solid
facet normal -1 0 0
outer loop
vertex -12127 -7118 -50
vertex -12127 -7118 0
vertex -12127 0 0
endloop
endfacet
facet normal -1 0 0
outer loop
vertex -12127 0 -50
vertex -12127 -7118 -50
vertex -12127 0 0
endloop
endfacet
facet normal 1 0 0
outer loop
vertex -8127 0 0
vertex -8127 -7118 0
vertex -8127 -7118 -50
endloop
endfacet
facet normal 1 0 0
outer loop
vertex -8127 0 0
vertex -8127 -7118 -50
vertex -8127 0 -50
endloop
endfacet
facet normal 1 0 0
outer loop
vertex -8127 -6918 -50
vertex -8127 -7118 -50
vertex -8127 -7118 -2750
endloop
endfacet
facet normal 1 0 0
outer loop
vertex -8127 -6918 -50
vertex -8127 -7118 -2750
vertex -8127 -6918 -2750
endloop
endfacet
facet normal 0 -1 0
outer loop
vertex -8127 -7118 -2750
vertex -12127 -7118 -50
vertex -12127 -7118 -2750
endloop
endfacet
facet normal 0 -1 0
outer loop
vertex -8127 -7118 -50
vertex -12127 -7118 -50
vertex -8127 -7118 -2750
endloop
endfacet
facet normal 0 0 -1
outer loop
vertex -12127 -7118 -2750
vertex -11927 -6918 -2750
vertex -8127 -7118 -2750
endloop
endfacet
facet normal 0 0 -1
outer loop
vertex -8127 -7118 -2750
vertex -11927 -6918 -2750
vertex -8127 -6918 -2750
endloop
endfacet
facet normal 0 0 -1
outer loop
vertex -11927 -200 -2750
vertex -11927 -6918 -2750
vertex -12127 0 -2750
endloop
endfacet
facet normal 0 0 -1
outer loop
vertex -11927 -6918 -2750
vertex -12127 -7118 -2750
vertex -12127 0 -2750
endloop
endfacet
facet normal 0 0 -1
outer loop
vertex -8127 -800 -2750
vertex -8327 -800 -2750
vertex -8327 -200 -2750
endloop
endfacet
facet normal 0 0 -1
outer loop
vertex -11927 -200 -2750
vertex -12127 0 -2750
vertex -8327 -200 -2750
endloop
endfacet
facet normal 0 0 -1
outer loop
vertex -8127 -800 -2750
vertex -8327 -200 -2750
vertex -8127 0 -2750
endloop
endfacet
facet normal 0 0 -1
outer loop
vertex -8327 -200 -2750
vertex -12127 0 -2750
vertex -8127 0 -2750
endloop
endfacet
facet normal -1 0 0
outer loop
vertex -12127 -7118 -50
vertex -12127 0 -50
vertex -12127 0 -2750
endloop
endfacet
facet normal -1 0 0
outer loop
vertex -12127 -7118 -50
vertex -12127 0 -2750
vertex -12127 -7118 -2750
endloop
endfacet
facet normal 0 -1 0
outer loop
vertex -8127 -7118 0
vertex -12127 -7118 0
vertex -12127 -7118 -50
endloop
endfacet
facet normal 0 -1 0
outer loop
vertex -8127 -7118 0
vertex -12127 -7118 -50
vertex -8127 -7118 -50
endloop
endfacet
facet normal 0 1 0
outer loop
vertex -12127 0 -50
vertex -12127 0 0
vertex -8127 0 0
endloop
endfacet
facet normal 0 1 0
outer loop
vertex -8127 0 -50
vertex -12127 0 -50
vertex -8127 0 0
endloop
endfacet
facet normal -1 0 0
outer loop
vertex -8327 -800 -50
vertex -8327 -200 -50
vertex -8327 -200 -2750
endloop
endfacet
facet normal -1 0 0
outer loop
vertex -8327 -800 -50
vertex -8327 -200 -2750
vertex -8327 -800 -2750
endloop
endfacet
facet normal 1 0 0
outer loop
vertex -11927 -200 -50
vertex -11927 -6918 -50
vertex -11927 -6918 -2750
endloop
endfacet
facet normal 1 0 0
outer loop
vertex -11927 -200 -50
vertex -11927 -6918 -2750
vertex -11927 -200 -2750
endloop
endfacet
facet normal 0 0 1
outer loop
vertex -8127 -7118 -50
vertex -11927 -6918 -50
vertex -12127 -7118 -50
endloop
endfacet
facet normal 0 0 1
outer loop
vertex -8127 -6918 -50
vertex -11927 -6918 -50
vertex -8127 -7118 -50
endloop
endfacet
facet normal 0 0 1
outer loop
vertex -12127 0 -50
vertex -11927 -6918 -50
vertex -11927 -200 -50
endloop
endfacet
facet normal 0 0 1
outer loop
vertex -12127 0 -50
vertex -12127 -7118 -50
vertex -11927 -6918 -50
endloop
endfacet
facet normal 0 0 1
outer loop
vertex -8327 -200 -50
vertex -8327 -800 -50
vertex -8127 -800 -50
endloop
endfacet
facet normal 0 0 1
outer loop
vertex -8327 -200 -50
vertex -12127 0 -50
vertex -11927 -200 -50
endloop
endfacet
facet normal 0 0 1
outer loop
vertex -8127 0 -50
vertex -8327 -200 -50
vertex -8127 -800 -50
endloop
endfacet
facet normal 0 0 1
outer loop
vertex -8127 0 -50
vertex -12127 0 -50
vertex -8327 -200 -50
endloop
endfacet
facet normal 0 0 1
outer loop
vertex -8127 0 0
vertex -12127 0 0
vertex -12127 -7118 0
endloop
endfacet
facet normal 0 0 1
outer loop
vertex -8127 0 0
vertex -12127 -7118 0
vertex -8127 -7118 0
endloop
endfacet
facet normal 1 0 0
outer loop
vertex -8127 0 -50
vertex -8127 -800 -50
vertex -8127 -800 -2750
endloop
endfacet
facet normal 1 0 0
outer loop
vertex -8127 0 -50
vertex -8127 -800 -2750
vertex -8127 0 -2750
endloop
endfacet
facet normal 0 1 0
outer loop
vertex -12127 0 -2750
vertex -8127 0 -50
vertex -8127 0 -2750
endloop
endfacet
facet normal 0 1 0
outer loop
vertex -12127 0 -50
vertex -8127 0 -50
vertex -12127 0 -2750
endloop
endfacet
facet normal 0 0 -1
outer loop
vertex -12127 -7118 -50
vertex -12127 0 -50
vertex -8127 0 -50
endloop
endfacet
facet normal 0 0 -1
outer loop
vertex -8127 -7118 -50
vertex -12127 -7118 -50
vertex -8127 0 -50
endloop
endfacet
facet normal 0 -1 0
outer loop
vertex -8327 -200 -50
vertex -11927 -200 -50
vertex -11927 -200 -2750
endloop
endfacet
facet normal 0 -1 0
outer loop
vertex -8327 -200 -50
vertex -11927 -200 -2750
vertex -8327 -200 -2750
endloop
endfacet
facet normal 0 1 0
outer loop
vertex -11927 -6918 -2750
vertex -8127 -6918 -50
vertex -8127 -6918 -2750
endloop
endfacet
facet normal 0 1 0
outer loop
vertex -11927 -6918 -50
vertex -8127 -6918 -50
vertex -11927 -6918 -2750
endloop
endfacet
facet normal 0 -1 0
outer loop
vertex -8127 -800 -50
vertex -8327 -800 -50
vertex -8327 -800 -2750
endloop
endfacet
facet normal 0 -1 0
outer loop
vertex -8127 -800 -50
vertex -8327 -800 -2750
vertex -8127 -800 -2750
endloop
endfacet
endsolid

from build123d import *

# Parameters (mm, degrees)
SKETCH_1_W      = 4000
SKETCH_1_H      = 7118
EXTRUDE_1_DEPTH = 50
EXTRUDE_2_DEPTH = 2700


with BuildPart() as part:
    # Эскиз1 → Бобышка-Вытянуть1 (new body)
    with BuildSketch(Plane.XY):
        with Locations((-10127, -3559)):
            Rectangle(SKETCH_1_W, SKETCH_1_H)
    extrude(amount=-EXTRUDE_1_DEPTH)


with BuildPart() as body_2:
    # Эскиз2 → Бобышка-Вытянуть2 (new body)
    with BuildSketch(Plane(origin=(0, 0, -50), x_dir=(-1, 0, 0), z_dir=(0, 0, -1))):
        Polygon((8127, -800), (8127, 0), (12127, 0), (12127, -7118), (8127, -7118), (8127, -6918), (11927, -6918), (11927, -200), (8327, -200), (8327, -800), align=None)
    extrude(amount=EXTRUDE_2_DEPTH)


solid = Compound([part.part, body_2.part])
